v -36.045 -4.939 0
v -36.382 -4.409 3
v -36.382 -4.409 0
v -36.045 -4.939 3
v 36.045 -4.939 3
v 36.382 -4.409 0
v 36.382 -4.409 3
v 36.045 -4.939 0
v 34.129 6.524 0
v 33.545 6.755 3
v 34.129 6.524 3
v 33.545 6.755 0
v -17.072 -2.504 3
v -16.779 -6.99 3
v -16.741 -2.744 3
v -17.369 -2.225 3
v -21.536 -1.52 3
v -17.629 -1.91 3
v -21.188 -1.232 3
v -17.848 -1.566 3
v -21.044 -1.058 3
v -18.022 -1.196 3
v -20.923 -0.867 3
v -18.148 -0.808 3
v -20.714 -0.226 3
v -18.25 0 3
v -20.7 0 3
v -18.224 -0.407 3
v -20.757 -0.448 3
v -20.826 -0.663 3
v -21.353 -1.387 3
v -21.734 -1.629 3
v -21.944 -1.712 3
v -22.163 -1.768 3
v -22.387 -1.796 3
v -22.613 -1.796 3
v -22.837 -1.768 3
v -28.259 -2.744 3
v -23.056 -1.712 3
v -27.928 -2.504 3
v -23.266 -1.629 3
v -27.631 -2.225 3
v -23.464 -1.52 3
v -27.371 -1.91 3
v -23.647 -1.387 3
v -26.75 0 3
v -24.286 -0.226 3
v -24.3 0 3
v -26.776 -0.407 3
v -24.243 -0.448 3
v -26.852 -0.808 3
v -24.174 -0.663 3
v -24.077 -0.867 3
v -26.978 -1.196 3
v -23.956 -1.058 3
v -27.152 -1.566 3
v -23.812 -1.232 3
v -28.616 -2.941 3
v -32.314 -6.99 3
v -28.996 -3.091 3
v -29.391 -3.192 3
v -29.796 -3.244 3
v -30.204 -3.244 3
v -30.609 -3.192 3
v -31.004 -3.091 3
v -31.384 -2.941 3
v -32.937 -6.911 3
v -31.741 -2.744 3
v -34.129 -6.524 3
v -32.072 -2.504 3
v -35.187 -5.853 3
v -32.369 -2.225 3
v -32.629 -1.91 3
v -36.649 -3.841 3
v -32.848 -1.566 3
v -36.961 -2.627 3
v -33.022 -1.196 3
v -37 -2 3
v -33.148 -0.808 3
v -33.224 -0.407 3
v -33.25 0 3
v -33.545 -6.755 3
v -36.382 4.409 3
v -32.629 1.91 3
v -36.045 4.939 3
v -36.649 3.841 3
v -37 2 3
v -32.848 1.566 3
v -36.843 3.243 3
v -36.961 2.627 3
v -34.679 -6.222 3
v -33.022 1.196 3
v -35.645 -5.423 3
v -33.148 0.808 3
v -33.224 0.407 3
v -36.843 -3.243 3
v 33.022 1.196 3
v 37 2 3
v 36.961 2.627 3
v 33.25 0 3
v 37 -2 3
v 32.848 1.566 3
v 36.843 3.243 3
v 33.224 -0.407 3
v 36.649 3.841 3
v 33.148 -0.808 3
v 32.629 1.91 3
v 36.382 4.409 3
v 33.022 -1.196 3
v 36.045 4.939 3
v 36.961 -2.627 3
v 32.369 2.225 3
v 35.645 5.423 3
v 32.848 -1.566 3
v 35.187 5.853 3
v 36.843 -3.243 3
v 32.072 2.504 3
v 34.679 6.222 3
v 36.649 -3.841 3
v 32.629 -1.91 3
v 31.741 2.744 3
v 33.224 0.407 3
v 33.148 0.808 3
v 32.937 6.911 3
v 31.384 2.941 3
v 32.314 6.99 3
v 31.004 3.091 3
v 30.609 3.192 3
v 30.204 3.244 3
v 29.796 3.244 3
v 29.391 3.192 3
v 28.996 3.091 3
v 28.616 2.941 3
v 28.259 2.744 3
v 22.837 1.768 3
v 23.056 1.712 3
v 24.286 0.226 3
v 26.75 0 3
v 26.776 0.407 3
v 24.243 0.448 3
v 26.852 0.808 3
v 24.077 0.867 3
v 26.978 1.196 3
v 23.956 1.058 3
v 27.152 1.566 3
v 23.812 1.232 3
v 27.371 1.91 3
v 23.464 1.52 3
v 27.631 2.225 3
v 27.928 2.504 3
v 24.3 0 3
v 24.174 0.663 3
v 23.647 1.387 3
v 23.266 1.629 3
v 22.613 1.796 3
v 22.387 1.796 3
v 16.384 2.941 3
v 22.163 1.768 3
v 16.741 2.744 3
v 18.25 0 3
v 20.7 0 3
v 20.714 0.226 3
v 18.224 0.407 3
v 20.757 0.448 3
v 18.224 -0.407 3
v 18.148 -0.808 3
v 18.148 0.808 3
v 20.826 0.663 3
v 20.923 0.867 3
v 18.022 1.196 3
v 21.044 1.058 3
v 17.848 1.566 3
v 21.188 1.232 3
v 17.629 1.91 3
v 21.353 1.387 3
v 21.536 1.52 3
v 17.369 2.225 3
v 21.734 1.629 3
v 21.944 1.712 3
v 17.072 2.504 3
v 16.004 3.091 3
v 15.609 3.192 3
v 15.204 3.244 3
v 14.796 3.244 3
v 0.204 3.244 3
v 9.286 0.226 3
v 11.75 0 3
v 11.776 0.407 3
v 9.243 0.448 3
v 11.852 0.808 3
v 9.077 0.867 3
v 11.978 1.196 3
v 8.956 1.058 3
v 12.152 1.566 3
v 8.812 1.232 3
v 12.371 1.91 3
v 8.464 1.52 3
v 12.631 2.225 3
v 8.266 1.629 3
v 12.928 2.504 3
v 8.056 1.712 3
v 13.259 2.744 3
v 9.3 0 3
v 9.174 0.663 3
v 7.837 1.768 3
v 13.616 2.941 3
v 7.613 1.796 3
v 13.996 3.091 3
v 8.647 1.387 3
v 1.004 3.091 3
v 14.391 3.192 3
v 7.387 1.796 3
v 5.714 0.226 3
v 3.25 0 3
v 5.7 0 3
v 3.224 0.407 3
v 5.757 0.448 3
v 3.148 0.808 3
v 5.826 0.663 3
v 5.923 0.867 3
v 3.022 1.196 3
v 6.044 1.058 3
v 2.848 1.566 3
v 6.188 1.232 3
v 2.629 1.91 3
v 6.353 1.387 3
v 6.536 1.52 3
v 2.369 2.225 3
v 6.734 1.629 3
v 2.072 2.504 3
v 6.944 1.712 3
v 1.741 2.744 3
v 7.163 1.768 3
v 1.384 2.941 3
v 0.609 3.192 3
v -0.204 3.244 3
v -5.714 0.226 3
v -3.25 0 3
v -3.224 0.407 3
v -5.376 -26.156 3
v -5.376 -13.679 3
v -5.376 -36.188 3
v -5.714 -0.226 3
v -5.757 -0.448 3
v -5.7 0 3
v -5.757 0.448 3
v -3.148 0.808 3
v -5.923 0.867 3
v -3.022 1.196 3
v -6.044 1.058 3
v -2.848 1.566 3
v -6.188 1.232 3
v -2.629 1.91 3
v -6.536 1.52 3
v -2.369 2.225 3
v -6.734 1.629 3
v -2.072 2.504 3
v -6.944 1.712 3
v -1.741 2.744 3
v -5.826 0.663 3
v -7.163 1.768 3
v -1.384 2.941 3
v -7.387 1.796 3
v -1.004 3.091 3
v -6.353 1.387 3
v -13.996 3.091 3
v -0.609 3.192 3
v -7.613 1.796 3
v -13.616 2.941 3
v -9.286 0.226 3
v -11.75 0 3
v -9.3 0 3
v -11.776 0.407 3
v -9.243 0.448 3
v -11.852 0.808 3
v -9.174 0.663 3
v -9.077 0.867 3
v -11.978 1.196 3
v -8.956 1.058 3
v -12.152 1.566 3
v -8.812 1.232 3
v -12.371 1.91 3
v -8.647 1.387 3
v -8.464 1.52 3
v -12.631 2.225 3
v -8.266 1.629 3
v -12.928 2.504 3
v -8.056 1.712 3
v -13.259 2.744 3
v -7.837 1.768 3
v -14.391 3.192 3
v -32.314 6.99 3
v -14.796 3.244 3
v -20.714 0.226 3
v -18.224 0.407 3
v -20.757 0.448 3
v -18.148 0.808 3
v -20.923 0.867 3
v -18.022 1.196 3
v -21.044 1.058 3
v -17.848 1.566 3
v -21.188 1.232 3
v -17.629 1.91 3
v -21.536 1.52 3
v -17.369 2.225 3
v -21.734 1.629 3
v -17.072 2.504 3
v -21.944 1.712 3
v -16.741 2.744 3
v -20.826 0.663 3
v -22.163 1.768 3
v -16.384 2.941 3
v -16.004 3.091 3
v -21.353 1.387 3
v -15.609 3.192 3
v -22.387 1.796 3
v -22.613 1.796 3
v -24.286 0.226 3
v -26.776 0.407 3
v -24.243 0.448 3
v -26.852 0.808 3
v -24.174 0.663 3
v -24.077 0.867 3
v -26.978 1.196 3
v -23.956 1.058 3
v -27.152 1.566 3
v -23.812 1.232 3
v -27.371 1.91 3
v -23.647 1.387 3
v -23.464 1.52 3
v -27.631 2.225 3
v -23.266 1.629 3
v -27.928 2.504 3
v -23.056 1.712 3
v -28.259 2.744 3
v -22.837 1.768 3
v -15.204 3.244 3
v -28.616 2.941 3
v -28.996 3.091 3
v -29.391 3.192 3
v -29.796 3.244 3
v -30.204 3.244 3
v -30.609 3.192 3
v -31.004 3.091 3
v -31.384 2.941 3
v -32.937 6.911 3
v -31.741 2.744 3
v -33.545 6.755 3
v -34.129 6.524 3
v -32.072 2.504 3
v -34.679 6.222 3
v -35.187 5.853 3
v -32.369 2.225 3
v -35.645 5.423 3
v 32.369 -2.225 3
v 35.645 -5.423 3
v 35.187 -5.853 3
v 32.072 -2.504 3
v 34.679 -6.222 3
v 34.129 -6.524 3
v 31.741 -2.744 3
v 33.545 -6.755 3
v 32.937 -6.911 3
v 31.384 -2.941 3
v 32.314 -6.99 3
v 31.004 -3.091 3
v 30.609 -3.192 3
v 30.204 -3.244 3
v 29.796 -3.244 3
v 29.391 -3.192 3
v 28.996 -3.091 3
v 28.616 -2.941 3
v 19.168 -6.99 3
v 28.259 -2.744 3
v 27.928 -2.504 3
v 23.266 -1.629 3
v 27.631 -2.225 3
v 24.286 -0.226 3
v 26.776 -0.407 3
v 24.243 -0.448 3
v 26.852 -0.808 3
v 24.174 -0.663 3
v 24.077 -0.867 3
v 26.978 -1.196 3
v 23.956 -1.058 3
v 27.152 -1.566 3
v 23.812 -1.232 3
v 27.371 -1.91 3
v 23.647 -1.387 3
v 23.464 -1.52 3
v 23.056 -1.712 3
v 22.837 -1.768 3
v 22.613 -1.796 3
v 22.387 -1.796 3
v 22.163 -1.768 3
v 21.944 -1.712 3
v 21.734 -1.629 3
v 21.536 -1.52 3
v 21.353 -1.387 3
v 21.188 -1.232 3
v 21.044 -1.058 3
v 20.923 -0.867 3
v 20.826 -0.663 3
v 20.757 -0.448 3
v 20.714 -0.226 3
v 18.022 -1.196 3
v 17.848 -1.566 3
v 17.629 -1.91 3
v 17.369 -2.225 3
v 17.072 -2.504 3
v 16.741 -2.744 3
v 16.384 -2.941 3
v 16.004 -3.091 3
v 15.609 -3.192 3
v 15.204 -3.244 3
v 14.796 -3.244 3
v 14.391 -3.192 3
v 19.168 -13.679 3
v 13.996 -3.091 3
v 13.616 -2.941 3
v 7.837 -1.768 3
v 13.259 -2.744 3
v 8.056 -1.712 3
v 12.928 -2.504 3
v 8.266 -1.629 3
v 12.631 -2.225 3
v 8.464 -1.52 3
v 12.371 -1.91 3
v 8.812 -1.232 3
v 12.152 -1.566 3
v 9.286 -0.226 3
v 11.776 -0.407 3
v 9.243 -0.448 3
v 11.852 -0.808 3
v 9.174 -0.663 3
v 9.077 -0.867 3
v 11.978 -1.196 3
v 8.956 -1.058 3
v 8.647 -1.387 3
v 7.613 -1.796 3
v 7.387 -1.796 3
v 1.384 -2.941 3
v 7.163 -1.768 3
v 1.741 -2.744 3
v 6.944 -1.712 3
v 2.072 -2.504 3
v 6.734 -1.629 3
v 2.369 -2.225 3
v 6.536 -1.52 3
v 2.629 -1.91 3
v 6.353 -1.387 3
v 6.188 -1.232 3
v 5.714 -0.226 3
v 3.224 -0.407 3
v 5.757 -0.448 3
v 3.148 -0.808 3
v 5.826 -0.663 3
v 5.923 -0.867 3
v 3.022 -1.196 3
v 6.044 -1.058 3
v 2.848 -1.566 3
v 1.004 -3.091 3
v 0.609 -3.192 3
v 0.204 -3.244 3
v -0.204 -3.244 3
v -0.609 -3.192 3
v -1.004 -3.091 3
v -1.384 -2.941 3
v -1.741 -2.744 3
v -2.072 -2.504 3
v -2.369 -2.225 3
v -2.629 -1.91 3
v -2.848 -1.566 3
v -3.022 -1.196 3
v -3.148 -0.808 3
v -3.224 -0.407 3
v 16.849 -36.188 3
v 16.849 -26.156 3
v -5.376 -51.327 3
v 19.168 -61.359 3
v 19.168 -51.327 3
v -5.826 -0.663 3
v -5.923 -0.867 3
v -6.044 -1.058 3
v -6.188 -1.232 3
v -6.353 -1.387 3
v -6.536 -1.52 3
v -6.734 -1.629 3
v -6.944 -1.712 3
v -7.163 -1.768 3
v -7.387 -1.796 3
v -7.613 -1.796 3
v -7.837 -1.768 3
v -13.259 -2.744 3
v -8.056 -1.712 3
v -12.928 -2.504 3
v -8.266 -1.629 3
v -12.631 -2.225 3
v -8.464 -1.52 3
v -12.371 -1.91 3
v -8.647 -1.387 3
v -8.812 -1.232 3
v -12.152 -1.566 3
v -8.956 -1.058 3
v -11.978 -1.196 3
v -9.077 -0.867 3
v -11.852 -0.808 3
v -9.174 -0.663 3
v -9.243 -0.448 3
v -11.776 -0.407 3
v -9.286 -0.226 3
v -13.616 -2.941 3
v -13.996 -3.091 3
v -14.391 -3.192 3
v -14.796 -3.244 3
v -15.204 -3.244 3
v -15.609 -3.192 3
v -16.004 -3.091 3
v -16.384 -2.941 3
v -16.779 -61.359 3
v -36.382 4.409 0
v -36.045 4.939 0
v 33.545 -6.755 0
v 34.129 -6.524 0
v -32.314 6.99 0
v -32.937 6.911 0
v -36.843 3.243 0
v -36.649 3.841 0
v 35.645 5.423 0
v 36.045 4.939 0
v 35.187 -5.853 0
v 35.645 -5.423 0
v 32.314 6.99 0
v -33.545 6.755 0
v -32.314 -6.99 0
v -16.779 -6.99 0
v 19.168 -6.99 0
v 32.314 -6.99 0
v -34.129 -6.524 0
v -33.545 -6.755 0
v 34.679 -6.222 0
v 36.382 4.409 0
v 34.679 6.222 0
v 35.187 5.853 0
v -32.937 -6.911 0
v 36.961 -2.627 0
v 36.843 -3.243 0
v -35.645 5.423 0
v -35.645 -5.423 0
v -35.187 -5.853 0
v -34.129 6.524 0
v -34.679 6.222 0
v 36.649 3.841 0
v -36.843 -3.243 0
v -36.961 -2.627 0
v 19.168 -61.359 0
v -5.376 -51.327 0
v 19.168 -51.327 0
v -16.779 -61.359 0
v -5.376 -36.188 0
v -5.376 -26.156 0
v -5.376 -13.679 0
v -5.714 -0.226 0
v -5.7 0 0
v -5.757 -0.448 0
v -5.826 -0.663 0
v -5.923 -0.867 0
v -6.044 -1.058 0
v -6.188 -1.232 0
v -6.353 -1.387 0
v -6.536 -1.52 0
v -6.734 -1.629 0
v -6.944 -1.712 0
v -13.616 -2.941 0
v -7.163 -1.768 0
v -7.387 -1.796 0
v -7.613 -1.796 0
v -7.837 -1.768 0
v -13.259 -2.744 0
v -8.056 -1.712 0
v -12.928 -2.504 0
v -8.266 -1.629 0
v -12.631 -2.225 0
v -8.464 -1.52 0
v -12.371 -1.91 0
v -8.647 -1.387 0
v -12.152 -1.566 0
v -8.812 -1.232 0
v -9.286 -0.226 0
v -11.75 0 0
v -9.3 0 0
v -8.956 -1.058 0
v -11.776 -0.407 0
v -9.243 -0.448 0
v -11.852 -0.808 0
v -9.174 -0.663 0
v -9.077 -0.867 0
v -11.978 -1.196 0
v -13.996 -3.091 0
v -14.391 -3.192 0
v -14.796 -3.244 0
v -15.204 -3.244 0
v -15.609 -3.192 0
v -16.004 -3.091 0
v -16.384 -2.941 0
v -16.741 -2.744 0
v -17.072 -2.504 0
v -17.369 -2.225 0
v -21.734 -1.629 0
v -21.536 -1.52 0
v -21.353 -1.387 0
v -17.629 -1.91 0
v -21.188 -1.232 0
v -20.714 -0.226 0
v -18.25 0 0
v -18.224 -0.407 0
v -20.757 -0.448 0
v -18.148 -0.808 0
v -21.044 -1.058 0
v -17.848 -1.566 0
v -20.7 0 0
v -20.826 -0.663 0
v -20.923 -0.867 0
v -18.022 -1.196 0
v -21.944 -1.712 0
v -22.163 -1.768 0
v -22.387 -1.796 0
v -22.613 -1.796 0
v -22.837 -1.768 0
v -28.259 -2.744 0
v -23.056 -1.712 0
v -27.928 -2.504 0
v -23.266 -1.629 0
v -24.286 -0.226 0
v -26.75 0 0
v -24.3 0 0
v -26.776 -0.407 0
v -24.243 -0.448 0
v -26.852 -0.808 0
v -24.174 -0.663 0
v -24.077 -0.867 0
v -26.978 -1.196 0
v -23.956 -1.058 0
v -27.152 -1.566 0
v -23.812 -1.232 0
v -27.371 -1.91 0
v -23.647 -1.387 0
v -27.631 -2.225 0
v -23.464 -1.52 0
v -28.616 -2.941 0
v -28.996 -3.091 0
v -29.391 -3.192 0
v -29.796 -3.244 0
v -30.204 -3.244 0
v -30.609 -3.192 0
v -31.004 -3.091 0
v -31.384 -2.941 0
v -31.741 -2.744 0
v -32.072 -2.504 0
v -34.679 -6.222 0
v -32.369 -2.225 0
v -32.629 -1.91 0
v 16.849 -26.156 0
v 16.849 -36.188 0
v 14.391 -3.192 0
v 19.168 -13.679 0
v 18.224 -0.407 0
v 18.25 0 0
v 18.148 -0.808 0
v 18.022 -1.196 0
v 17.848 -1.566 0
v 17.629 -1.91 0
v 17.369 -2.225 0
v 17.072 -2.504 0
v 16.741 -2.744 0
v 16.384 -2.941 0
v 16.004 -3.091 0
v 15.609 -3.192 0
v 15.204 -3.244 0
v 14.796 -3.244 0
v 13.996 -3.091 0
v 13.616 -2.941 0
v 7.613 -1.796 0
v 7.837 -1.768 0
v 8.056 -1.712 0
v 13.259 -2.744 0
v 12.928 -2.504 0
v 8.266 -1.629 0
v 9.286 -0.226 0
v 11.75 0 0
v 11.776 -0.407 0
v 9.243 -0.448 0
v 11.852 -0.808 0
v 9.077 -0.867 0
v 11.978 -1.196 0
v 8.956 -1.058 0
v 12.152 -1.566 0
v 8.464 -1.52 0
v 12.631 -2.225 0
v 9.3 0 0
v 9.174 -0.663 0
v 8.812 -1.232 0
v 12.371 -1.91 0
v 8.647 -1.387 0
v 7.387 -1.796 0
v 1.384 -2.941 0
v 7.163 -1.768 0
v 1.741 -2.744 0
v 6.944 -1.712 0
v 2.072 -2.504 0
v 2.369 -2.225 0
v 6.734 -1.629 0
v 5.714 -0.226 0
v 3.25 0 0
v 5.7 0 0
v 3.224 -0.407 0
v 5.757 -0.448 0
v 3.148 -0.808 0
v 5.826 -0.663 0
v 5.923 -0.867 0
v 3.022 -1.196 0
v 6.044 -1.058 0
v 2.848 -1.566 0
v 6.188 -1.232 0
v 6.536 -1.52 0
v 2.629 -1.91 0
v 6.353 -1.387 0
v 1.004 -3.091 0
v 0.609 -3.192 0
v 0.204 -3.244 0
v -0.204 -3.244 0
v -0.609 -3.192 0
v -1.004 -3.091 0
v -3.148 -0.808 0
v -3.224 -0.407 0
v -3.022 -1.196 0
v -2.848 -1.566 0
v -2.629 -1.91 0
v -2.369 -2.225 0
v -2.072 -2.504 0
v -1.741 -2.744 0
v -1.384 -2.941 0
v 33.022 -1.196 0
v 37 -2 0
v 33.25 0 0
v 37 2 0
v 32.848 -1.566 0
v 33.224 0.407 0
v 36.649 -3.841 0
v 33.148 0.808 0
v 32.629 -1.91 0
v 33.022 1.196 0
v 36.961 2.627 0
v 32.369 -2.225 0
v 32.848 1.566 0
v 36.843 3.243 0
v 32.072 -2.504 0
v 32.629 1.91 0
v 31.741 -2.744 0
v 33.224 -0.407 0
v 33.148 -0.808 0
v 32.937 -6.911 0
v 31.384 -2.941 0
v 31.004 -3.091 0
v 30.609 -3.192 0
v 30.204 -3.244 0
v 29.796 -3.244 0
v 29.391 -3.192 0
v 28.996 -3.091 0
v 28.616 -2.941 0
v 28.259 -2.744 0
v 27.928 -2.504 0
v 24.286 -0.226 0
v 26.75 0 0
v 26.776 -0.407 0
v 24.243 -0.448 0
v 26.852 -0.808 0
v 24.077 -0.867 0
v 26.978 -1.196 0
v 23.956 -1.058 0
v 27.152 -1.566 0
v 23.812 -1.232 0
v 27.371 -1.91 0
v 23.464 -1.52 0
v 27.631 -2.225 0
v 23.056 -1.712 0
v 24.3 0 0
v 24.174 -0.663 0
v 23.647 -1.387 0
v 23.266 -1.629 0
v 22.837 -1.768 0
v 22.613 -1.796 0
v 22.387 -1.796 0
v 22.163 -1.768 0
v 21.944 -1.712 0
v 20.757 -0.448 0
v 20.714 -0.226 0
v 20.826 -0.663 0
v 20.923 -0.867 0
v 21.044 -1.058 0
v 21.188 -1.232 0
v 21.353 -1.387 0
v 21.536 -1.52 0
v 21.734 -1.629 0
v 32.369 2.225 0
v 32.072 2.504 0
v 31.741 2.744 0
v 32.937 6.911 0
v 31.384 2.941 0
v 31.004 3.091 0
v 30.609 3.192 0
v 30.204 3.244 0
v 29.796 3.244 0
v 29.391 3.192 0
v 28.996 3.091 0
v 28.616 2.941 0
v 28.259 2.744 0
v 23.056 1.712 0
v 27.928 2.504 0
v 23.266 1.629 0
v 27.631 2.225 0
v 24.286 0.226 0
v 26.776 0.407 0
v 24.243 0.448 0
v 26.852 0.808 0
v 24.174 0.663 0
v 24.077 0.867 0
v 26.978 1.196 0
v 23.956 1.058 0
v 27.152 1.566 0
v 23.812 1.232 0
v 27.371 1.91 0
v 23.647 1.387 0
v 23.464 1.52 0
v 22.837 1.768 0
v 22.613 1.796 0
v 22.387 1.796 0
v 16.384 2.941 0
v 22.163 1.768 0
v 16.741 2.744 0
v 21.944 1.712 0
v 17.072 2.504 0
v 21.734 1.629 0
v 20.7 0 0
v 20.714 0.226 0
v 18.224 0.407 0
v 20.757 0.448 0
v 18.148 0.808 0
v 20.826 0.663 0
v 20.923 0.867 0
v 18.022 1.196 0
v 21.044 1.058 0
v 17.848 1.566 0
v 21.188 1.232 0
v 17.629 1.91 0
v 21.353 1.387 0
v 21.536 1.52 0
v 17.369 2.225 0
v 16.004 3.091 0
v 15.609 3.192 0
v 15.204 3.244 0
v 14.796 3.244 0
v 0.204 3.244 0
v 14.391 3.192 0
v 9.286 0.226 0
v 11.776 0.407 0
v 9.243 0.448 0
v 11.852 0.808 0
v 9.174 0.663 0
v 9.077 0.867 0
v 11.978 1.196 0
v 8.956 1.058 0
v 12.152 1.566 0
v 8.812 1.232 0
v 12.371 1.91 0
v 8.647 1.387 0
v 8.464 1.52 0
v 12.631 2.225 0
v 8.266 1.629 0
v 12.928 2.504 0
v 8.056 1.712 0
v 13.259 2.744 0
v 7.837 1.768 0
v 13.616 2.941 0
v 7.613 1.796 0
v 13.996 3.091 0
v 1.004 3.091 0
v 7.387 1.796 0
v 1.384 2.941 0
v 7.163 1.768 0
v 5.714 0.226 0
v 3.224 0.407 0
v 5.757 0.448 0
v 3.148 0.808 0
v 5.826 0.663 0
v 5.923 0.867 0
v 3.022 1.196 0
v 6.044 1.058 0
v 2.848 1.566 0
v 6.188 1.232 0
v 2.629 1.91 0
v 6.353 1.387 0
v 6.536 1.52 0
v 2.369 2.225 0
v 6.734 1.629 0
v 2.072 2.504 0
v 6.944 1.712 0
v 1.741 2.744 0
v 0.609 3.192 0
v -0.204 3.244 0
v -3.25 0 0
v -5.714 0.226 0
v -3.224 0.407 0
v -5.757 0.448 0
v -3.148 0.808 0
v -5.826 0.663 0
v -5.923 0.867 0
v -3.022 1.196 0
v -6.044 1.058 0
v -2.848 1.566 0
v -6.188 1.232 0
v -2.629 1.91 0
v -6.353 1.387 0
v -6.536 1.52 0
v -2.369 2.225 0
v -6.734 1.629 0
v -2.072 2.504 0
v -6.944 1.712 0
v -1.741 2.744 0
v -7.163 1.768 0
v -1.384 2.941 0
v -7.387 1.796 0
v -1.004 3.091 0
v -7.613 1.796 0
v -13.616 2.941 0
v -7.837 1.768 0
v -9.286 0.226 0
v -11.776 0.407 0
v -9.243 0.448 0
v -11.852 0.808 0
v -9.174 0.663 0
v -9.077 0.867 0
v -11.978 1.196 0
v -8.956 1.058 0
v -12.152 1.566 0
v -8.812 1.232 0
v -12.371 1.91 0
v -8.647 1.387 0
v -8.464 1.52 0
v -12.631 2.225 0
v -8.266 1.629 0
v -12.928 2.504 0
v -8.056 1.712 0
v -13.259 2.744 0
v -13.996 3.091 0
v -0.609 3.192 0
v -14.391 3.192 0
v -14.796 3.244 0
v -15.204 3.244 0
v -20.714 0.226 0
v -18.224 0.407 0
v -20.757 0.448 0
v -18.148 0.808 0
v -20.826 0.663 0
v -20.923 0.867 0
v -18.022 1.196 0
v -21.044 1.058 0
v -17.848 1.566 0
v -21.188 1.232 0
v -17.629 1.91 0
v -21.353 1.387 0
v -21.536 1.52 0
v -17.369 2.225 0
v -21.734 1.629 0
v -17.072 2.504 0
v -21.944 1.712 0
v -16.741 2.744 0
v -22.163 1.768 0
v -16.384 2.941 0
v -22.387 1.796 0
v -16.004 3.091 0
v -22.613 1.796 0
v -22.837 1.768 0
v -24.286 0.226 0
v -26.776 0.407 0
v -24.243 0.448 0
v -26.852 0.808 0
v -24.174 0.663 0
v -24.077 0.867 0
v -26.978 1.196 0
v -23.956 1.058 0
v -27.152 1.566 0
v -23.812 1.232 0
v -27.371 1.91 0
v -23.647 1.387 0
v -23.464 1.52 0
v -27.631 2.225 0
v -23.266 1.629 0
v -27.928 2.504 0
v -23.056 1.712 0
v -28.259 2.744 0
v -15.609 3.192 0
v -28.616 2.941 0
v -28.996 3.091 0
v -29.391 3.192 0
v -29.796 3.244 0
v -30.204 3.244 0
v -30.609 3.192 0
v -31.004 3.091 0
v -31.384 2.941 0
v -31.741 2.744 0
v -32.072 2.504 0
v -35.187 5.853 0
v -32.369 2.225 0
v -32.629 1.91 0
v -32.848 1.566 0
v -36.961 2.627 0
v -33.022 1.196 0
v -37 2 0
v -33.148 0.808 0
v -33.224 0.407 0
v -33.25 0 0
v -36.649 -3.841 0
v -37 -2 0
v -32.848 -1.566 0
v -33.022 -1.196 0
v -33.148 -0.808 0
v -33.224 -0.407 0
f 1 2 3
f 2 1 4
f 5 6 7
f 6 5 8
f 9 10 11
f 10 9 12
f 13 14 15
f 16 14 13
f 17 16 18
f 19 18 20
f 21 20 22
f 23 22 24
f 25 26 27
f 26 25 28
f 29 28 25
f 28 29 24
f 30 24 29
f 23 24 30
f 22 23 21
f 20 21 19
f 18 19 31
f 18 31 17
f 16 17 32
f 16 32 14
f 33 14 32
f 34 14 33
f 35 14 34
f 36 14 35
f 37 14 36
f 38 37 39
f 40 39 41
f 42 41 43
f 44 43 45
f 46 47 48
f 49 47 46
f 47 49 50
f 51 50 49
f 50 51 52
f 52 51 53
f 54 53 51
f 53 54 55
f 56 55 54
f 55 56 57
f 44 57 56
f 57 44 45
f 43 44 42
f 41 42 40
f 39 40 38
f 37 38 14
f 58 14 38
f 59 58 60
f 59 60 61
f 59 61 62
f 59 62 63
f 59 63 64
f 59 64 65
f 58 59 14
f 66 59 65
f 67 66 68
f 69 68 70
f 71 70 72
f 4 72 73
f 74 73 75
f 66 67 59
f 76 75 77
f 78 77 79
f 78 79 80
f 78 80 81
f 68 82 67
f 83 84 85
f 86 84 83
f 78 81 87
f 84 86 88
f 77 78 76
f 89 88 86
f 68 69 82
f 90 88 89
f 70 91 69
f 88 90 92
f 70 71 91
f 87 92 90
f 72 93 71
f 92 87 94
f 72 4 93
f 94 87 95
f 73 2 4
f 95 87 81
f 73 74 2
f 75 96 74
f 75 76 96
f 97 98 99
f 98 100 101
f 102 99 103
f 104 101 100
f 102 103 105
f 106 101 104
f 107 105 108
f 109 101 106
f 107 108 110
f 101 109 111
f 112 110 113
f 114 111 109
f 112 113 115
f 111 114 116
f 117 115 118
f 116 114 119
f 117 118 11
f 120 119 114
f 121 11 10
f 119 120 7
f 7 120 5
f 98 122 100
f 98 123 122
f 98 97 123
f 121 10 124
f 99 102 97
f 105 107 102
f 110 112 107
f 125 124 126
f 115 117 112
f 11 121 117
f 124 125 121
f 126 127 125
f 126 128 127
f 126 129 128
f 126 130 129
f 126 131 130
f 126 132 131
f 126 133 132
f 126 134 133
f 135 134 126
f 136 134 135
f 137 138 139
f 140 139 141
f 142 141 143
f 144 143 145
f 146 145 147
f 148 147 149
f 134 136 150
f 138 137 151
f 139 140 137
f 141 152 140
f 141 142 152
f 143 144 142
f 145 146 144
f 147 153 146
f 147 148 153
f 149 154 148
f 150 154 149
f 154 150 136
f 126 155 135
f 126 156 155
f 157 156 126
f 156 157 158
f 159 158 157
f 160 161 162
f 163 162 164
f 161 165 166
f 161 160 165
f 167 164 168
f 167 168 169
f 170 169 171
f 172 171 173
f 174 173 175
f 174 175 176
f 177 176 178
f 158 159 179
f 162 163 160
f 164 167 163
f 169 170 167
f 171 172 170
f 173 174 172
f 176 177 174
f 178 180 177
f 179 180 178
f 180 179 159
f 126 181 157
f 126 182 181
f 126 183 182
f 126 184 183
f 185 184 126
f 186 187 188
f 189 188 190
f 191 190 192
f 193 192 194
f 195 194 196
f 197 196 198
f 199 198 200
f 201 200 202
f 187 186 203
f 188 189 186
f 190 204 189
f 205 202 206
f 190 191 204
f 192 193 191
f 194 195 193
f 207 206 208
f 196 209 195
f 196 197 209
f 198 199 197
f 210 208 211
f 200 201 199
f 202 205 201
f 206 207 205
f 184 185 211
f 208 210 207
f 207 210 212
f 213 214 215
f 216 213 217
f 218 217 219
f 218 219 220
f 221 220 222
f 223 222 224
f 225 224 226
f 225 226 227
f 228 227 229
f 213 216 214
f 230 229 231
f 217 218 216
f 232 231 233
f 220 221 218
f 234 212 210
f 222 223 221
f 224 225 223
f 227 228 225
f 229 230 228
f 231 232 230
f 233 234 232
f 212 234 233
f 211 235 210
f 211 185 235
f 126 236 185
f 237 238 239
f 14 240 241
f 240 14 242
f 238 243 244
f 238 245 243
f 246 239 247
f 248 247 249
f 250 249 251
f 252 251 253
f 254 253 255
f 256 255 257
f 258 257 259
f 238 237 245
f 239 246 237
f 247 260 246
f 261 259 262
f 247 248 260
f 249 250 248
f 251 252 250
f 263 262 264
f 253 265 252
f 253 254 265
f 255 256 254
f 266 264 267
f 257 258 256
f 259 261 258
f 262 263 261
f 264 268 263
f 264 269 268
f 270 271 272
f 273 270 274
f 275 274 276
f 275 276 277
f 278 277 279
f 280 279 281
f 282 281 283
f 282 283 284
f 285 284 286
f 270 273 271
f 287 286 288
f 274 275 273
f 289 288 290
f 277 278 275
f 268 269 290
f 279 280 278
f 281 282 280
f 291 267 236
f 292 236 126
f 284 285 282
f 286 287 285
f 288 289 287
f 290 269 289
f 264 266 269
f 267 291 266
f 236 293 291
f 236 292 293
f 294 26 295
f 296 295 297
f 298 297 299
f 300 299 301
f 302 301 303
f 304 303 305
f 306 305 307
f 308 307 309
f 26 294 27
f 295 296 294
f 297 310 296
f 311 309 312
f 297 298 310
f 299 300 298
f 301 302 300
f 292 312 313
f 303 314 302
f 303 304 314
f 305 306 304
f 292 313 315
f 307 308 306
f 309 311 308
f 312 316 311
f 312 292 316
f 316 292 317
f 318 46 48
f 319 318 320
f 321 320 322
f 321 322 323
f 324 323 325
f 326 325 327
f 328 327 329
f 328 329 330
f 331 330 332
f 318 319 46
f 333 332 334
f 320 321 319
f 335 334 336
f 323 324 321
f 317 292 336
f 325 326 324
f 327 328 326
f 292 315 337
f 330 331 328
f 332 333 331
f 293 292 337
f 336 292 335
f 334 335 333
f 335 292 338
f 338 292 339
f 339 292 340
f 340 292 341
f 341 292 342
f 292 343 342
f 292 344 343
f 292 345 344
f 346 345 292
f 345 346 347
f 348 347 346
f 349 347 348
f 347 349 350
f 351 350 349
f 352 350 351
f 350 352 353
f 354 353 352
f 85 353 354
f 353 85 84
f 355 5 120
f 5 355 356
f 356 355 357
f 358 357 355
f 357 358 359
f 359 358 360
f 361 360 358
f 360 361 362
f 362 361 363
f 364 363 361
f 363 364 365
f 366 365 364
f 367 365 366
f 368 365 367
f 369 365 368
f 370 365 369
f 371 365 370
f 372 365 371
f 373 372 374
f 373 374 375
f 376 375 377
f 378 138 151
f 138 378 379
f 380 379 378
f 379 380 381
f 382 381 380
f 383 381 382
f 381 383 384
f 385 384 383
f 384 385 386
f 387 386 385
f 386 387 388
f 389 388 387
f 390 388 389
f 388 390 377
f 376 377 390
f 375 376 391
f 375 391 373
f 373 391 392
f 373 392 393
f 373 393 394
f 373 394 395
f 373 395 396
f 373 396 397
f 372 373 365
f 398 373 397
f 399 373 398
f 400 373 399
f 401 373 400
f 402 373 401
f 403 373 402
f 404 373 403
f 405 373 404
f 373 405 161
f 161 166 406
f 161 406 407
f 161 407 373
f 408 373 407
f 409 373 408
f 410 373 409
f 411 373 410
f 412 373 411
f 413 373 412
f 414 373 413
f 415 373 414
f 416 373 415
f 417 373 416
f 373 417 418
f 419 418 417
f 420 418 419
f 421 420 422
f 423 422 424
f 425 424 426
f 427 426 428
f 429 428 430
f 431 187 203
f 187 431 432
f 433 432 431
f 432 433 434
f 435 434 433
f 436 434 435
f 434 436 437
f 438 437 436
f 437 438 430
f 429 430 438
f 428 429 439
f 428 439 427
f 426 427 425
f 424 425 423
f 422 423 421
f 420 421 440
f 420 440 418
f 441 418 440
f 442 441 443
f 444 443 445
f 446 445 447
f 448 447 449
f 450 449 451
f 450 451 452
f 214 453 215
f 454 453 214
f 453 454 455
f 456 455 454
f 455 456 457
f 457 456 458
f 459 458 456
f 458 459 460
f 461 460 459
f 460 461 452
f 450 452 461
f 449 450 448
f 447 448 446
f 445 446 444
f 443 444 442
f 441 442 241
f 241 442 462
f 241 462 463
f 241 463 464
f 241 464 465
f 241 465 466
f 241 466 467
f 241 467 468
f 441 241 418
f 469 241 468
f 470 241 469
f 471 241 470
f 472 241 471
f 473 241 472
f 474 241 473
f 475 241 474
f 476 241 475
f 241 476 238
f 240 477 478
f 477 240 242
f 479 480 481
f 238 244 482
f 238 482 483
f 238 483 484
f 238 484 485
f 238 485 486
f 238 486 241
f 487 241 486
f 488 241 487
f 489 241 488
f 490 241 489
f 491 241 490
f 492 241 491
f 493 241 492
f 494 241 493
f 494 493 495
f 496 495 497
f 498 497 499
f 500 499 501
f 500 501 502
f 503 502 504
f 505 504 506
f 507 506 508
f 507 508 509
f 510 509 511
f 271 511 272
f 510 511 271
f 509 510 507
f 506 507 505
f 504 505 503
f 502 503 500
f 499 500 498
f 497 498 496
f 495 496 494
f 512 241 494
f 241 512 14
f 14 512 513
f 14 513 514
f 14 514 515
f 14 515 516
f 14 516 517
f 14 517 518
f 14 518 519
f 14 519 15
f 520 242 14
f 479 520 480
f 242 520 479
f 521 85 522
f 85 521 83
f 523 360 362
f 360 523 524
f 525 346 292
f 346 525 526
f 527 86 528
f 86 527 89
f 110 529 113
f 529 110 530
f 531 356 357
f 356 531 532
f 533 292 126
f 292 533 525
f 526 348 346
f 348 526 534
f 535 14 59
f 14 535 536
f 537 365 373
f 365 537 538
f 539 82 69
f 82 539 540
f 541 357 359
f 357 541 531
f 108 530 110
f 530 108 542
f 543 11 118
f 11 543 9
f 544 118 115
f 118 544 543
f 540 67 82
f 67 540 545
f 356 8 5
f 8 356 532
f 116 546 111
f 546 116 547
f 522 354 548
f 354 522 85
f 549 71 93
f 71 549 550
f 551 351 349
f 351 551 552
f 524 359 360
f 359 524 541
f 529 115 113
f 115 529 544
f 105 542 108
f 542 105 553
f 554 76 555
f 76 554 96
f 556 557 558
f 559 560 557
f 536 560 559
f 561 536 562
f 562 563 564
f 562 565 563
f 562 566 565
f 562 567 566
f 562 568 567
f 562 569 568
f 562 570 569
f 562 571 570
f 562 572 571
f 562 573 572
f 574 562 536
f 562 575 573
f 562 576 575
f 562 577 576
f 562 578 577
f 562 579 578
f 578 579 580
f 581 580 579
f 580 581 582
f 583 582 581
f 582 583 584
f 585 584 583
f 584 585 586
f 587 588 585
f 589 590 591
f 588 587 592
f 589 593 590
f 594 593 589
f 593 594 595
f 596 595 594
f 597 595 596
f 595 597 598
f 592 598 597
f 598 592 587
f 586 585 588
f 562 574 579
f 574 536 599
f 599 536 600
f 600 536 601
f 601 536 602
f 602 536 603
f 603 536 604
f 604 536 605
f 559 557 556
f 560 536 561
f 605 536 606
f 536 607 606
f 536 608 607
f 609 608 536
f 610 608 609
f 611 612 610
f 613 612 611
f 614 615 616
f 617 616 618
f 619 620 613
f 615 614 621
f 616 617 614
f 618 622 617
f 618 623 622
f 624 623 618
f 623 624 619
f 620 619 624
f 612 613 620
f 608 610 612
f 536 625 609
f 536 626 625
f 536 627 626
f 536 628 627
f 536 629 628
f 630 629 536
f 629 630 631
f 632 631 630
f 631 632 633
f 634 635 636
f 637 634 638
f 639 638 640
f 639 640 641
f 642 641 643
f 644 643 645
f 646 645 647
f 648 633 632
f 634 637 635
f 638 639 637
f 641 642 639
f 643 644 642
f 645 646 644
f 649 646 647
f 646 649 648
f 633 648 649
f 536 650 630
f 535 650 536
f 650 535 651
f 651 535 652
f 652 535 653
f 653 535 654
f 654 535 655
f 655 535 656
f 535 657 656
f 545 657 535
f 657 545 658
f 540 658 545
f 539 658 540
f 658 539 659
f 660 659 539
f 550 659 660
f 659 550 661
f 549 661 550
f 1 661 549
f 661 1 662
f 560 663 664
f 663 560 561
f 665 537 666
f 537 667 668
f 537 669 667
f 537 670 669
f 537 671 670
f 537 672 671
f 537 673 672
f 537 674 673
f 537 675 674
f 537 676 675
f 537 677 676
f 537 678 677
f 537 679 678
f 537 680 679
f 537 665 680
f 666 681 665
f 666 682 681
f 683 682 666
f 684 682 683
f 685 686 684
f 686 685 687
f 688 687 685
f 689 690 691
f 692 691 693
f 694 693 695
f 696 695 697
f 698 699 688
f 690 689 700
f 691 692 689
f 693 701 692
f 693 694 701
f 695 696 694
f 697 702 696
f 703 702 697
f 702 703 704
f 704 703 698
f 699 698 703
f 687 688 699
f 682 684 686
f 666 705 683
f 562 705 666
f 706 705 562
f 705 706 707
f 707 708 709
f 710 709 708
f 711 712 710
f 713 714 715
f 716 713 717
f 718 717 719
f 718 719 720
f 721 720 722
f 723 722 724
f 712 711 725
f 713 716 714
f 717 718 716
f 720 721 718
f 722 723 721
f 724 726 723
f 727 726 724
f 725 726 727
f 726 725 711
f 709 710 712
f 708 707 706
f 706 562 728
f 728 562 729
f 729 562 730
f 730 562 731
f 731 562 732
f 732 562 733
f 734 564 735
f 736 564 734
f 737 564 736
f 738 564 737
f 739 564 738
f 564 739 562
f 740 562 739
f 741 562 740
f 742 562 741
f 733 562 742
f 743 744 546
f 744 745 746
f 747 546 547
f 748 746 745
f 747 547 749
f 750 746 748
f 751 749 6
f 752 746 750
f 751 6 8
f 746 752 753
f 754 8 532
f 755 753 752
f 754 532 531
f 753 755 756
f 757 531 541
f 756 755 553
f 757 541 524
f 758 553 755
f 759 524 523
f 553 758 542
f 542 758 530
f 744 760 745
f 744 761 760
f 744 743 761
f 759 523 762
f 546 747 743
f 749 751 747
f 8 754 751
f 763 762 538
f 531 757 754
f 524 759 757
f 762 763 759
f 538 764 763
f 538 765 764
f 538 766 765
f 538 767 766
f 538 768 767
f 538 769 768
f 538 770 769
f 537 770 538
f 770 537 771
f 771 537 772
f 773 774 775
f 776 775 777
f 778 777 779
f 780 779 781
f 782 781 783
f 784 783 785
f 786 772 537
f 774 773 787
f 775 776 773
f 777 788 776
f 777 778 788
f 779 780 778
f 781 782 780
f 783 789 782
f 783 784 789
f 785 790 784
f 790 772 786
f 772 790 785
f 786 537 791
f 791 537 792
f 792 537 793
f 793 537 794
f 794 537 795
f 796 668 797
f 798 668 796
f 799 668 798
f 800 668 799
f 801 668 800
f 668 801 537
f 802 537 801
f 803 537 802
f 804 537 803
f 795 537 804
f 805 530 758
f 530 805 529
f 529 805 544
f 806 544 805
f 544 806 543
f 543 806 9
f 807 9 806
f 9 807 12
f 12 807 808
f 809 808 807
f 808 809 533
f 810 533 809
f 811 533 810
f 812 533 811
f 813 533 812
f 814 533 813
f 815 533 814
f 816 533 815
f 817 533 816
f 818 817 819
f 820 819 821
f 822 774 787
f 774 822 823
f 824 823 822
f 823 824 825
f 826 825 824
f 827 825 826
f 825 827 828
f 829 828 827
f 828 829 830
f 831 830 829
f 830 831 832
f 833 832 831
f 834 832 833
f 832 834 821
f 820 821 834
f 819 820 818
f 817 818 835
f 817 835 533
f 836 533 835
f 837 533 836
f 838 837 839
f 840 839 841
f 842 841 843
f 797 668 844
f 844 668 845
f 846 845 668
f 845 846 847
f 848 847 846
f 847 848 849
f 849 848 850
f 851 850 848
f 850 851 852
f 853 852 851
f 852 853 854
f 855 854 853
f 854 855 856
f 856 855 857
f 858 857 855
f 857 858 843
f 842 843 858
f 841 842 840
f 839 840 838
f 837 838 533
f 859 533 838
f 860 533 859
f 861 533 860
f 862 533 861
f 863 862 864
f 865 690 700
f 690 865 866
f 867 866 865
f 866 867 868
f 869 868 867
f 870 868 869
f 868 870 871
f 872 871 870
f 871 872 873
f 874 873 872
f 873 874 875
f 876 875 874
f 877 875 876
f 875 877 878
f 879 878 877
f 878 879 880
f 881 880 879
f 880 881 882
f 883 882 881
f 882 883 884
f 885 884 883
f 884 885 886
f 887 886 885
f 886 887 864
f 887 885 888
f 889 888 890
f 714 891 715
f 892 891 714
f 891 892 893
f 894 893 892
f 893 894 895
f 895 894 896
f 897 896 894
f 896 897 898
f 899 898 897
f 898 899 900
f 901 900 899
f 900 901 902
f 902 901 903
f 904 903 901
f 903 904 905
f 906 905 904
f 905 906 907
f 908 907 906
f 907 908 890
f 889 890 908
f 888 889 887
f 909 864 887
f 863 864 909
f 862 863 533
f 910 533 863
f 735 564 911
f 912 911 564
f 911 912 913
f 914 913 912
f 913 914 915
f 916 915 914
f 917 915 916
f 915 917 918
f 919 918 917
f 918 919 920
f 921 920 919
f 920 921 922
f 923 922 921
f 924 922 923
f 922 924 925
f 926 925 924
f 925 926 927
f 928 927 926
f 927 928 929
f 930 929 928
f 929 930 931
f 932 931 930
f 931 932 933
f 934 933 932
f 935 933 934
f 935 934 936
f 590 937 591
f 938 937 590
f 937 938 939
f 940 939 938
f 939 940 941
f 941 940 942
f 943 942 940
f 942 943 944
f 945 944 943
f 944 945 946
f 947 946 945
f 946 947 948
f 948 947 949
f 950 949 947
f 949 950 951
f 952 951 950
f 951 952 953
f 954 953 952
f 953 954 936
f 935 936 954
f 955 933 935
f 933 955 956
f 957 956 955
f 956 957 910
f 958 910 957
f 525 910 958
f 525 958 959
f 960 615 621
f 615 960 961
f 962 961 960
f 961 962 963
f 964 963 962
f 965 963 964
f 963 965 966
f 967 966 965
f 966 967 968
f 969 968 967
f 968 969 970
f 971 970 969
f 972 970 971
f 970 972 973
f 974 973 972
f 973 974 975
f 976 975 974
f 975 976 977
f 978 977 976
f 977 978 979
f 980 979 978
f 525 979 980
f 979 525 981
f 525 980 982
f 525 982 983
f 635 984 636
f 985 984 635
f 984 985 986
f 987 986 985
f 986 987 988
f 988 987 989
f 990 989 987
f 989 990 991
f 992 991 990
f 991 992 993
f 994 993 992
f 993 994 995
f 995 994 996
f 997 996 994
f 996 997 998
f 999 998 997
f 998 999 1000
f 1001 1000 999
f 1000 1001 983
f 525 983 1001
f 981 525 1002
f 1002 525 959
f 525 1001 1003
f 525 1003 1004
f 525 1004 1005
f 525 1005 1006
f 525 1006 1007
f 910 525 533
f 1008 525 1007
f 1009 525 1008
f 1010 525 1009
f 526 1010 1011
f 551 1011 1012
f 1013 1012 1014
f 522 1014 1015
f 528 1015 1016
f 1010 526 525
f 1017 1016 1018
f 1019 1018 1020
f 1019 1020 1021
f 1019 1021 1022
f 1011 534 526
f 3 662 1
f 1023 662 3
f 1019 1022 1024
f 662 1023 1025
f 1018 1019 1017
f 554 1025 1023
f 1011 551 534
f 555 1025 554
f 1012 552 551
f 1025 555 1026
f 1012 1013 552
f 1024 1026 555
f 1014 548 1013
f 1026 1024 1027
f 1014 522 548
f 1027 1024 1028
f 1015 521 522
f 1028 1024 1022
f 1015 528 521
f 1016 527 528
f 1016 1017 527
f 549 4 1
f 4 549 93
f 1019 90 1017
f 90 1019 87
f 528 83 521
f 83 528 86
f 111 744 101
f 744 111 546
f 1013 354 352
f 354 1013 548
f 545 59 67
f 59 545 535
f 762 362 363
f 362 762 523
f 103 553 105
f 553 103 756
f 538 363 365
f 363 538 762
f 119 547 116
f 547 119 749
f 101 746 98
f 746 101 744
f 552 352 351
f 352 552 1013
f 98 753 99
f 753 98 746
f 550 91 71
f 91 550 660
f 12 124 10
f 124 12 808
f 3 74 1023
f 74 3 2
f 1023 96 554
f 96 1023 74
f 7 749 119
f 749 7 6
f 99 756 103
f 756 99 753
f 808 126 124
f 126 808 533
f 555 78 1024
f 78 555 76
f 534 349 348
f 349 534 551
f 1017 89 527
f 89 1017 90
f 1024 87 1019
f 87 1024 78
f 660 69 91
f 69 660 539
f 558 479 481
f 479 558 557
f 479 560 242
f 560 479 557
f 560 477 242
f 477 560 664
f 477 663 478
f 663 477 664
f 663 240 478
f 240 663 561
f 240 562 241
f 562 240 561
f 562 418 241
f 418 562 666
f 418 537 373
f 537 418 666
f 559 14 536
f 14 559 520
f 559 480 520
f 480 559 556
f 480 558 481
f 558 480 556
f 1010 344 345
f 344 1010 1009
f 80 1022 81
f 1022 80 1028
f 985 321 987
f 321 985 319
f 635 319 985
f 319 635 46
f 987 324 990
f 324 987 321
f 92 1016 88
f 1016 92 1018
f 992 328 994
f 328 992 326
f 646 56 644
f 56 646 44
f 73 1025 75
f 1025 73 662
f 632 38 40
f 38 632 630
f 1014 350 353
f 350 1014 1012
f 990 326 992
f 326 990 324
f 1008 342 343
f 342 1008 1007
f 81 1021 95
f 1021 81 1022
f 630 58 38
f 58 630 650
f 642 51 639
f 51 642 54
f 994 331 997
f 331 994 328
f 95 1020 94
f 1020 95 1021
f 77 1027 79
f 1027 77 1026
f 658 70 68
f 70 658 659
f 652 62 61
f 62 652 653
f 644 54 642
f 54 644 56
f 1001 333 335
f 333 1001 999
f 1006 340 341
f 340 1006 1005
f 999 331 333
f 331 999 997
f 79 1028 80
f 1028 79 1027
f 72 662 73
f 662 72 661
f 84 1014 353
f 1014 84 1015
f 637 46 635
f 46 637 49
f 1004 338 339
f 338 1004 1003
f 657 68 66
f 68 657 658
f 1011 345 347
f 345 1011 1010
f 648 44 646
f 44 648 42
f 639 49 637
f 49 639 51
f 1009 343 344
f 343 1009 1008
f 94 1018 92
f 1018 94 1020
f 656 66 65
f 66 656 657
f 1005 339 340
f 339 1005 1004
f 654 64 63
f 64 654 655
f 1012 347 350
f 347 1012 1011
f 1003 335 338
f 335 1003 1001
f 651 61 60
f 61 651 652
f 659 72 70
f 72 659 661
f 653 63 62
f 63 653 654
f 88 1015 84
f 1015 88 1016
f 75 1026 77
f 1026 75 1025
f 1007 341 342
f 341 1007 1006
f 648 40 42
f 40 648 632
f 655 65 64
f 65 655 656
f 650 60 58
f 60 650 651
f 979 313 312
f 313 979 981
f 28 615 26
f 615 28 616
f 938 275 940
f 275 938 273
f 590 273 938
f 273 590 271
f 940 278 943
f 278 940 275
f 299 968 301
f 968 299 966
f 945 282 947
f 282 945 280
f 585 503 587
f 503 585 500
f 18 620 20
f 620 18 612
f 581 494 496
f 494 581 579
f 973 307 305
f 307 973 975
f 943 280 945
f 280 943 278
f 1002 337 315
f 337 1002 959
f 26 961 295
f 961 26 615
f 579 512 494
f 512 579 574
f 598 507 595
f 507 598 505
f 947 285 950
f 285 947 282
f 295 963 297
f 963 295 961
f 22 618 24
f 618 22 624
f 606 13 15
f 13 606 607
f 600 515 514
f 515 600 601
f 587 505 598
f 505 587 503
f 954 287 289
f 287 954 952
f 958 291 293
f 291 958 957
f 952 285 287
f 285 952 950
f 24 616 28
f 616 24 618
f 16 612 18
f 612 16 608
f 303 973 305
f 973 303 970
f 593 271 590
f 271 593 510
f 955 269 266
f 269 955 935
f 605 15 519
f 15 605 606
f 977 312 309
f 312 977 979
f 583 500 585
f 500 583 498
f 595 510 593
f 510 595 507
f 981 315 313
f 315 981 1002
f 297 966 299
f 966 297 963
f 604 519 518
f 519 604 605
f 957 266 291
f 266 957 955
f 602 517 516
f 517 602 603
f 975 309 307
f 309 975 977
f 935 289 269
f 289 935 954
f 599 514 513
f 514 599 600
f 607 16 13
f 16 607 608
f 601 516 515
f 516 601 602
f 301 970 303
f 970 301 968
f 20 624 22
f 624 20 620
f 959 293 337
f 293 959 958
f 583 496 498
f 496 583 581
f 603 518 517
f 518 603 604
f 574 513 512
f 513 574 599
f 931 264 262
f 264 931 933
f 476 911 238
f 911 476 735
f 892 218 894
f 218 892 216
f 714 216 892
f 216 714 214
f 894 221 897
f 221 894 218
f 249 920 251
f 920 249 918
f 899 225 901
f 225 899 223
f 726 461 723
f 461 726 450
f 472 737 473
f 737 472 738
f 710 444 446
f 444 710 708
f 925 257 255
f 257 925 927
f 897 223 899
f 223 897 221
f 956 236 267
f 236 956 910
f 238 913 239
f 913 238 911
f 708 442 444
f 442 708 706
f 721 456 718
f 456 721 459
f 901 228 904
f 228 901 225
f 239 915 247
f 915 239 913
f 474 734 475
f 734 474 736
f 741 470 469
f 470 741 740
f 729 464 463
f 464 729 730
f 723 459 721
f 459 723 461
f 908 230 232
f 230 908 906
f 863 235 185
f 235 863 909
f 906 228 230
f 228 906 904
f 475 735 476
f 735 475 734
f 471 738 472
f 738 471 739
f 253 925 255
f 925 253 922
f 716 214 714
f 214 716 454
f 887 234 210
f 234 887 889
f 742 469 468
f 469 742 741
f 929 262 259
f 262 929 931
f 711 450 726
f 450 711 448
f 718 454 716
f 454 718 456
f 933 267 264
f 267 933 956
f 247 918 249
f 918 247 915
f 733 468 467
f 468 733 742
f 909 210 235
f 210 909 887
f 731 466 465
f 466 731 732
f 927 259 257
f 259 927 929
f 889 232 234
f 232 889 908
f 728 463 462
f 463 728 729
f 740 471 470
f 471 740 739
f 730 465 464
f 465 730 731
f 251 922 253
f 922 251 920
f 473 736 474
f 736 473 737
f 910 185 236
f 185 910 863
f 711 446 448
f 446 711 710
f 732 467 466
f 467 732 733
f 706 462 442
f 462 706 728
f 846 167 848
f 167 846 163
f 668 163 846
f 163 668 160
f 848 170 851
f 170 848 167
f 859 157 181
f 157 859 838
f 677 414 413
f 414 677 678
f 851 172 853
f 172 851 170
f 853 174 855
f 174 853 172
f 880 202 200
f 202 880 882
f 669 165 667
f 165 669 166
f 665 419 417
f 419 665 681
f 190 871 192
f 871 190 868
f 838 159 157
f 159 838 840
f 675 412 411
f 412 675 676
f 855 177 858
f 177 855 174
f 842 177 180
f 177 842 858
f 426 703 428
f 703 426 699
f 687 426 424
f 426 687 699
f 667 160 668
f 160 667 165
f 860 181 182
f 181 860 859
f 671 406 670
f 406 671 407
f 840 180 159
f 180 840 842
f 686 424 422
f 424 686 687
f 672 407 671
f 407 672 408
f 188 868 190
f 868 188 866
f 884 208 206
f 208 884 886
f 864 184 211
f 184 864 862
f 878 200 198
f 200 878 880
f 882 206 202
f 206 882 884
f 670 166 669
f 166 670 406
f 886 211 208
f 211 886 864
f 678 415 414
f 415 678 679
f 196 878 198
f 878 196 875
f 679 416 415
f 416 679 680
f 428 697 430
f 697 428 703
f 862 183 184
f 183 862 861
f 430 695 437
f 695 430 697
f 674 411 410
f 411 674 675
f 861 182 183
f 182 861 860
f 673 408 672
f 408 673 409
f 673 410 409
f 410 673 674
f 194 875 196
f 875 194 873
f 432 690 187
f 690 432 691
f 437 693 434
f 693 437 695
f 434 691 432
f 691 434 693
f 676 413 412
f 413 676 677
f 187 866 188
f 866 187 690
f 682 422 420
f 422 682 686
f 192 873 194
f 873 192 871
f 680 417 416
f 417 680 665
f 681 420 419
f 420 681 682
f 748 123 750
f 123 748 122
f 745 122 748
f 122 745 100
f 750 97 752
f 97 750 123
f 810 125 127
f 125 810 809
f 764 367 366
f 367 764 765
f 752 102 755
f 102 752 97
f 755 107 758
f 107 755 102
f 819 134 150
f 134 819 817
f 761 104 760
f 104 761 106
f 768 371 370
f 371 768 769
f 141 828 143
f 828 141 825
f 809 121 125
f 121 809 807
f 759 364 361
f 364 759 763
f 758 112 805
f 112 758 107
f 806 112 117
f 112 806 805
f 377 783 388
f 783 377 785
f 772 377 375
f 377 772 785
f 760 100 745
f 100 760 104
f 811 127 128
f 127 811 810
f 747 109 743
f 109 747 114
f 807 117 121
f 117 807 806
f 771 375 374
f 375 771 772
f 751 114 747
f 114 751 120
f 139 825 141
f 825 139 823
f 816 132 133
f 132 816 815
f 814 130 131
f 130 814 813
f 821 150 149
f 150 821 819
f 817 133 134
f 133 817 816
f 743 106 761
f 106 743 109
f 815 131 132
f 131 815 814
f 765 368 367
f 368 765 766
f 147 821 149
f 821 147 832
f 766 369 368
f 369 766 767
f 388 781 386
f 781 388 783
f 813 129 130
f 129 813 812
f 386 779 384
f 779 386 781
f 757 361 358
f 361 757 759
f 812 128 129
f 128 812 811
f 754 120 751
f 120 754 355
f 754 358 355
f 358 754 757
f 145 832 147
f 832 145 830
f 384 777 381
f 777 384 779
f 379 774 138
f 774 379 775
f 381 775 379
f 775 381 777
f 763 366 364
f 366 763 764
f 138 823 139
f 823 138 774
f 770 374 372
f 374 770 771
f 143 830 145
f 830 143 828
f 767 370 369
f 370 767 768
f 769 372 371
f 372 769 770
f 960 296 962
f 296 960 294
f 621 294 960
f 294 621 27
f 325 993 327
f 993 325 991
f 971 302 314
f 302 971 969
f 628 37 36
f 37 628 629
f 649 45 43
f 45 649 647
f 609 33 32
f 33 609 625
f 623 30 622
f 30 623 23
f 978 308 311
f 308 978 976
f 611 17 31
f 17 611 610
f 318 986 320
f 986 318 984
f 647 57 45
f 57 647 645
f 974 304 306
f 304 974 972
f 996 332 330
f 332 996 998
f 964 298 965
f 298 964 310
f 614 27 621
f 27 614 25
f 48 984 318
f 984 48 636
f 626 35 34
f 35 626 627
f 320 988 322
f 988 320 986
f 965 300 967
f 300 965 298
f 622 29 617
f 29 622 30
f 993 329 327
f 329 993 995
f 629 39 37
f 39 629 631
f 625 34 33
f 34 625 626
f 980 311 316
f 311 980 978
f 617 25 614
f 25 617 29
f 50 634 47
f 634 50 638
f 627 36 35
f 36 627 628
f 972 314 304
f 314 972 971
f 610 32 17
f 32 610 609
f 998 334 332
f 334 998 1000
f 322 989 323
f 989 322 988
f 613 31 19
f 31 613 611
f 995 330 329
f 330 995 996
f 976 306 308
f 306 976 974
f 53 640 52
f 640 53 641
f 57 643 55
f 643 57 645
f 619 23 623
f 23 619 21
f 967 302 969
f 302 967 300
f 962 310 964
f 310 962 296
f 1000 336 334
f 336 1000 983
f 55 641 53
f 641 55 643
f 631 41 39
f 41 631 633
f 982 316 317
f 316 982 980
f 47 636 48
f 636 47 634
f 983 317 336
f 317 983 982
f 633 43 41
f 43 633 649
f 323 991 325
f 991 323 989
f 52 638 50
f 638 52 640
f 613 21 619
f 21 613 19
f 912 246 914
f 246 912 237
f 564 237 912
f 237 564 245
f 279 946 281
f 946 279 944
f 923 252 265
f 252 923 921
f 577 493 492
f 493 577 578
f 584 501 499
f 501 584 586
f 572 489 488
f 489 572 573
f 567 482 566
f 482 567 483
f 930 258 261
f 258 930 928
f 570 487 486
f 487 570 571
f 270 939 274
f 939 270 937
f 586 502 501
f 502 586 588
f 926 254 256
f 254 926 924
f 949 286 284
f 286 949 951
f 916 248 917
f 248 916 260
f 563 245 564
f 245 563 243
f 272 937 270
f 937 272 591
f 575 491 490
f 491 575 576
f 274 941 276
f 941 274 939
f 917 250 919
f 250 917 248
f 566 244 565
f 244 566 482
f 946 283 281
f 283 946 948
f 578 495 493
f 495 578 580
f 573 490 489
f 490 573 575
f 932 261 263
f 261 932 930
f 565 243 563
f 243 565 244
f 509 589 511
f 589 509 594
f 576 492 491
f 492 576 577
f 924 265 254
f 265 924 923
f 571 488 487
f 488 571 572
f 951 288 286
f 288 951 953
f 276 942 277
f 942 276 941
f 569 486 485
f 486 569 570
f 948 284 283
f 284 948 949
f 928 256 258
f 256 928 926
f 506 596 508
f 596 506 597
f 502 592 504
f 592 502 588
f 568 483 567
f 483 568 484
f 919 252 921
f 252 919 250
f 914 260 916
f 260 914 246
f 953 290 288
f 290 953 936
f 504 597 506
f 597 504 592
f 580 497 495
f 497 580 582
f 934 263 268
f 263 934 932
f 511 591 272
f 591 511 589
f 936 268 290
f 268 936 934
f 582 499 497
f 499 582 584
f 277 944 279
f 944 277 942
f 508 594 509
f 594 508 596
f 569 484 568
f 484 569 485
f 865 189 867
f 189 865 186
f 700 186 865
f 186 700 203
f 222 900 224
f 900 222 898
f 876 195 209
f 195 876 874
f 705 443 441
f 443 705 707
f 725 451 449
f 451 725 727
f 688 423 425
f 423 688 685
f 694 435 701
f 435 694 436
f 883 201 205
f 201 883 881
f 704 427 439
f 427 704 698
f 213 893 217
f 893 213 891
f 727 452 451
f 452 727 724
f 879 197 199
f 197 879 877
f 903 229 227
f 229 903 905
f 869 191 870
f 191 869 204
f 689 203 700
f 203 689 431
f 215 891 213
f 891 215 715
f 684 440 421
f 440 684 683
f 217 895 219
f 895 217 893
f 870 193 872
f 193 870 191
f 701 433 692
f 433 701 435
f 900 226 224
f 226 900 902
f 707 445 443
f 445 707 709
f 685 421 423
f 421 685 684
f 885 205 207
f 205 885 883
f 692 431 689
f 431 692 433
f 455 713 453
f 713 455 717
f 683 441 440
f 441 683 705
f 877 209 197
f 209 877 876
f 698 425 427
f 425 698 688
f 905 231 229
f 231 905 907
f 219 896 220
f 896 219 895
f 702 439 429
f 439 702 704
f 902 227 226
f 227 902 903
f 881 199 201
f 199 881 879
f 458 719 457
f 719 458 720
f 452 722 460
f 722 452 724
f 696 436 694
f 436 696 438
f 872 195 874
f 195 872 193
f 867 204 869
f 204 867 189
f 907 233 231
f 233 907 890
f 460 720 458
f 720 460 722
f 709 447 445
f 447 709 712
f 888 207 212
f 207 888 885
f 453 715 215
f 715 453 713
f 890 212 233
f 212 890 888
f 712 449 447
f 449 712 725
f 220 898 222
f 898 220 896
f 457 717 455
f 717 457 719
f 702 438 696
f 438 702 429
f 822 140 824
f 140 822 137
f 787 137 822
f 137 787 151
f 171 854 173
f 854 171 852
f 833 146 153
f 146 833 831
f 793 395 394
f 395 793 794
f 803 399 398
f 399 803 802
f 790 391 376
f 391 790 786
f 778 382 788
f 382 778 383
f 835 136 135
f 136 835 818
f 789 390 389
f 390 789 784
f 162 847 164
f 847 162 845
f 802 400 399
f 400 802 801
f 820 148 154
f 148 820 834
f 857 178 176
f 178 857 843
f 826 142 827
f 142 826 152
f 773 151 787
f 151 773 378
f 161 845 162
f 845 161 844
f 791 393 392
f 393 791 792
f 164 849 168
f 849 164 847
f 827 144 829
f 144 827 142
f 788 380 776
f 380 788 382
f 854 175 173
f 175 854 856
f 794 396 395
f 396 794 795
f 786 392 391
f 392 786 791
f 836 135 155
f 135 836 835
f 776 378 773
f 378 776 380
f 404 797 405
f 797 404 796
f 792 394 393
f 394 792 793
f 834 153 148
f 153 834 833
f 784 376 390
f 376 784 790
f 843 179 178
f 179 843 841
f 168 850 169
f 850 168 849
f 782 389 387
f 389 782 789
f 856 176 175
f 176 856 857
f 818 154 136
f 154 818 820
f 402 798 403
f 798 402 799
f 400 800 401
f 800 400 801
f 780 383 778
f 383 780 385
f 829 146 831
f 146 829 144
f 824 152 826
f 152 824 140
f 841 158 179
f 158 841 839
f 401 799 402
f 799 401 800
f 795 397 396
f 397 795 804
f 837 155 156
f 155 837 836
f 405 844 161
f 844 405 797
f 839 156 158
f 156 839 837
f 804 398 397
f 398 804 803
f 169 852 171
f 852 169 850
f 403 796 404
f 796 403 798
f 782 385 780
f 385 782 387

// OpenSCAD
$fn = 50;


difference() {
	union() {
		hull() {
			translate(v = [-32.0000000000, 2.0000000000, 0]) {
				cylinder(h = 3, r = 5);
			}
			translate(v = [32.0000000000, 2.0000000000, 0]) {
				cylinder(h = 3, r = 5);
			}
			translate(v = [-32.0000000000, -2.0000000000, 0]) {
				cylinder(h = 3, r = 5);
			}
			translate(v = [32.0000000000, -2.0000000000, 0]) {
				cylinder(h = 3, r = 5);
			}
		}
		translate(v = [0, -5, 0]) {
			linear_extrude(height = 3) {
				text(font = "DejaVu Sans Mono:style=Bold", halign = "center", size = 57.0000000000, text = "E", valign = "top");
			}
		}
	}
	union() {
		translate(v = [-30.0000000000, 0.0000000000, 0]) {
			translate(v = [0, 0, -100]) {
				cylinder(h = 200, r = 3.2500000000);
			}
		}
		translate(v = [-15.0000000000, 0.0000000000, 0]) {
			translate(v = [0, 0, -100]) {
				cylinder(h = 200, r = 3.2500000000);
			}
		}
		translate(v = [0, 0, -100]) {
			cylinder(h = 200, r = 3.2500000000);
		}
		translate(v = [15.0000000000, 0.0000000000, 0]) {
			translate(v = [0, 0, -100]) {
				cylinder(h = 200, r = 3.2500000000);
			}
		}
		translate(v = [30.0000000000, 0.0000000000, 0]) {
			translate(v = [0, 0, -100]) {
				cylinder(h = 200, r = 3.2500000000);
			}
		}
		translate(v = [-30.0000000000, 0.0000000000, 0]) {
			translate(v = [0, 0, -100]) {
				cylinder(h = 200, r = 1.8000000000);
			}
		}
		translate(v = [-22.5000000000, 0.0000000000, 0]) {
			translate(v = [0, 0, -100]) {
				cylinder(h = 200, r = 1.8000000000);
			}
		}
		translate(v = [-15.0000000000, 0.0000000000, 0]) {
			translate(v = [0, 0, -100]) {
				cylinder(h = 200, r = 1.8000000000);
			}
		}
		translate(v = [-7.5000000000, 0.0000000000, 0]) {
			translate(v = [0, 0, -100]) {
				cylinder(h = 200, r = 1.8000000000);
			}
		}
		translate(v = [0, 0, -100]) {
			cylinder(h = 200, r = 1.8000000000);
		}
		translate(v = [7.5000000000, 0.0000000000, 0]) {
			translate(v = [0, 0, -100]) {
				cylinder(h = 200, r = 1.8000000000);
			}
		}
		translate(v = [15.0000000000, 0.0000000000, 0]) {
			translate(v = [0, 0, -100]) {
				cylinder(h = 200, r = 1.8000000000);
			}
		}
		translate(v = [22.5000000000, 0.0000000000, 0]) {
			translate(v = [0, 0, -100]) {
				cylinder(h = 200, r = 1.8000000000);
			}
		}
		translate(v = [30.0000000000, 0.0000000000, 0]) {
			translate(v = [0, 0, -100]) {
				cylinder(h = 200, r = 1.8000000000);
			}
		}
	}
}
